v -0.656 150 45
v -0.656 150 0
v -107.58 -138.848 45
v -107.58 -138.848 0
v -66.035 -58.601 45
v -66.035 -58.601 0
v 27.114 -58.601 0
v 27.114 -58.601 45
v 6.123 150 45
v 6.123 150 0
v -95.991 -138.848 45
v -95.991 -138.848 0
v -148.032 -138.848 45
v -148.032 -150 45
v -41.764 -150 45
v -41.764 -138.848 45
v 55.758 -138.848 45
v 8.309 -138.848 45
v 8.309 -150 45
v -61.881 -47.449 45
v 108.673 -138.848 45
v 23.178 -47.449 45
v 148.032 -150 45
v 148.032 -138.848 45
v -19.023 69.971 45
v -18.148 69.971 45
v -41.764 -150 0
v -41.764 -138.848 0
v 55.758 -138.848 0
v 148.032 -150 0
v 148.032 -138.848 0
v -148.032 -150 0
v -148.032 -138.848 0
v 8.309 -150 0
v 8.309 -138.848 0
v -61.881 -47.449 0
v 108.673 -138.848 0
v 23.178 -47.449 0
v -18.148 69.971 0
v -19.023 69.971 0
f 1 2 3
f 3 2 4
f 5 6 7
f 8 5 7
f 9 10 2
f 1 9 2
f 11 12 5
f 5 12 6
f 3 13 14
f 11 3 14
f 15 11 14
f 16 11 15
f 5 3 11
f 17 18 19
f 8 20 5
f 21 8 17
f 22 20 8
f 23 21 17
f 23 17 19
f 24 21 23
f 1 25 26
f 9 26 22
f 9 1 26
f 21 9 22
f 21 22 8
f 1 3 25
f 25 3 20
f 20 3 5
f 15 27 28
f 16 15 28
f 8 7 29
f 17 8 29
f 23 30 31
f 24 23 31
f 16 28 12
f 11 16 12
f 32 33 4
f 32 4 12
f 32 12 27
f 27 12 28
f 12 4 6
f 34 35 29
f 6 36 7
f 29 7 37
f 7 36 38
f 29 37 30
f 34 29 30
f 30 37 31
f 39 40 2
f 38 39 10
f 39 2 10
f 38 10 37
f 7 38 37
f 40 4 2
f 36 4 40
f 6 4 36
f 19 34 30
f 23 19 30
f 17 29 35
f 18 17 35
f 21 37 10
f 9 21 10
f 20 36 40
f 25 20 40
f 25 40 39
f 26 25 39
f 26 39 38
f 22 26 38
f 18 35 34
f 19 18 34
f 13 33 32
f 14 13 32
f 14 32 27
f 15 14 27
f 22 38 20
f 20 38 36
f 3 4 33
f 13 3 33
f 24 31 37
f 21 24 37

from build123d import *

# Parameters (mm, degrees)
F1_DEPTH = 45


with BuildPart() as f1:
    # F0 (on Top) → F1 (new body)
    with BuildSketch(Plane.XY):
        Polygon((-66.034691, -58.600819), (27.11419, -58.600819), (55.758373, -138.848471), (8.309083, -138.848471), (8.309083, -150), (148.032041, -150), (148.032041, -138.848471), (108.67285, -138.848471), (6.122862, 150), (-0.655503, 150), (-107.580103, -138.848471), (-148.032042, -138.848471), (-148.032042, -150), (-41.763672, -150), (-41.763672, -138.848471), (-95.990605, -138.848471), align=None)
        Polygon((23.178273, -47.44929), (-61.880509, -47.44929), (-19.023366, 69.970609), (-18.148157, 69.970609), align=None, mode=Mode.SUBTRACT)
    extrude(amount=F1_DEPTH)


solid = f1.part
